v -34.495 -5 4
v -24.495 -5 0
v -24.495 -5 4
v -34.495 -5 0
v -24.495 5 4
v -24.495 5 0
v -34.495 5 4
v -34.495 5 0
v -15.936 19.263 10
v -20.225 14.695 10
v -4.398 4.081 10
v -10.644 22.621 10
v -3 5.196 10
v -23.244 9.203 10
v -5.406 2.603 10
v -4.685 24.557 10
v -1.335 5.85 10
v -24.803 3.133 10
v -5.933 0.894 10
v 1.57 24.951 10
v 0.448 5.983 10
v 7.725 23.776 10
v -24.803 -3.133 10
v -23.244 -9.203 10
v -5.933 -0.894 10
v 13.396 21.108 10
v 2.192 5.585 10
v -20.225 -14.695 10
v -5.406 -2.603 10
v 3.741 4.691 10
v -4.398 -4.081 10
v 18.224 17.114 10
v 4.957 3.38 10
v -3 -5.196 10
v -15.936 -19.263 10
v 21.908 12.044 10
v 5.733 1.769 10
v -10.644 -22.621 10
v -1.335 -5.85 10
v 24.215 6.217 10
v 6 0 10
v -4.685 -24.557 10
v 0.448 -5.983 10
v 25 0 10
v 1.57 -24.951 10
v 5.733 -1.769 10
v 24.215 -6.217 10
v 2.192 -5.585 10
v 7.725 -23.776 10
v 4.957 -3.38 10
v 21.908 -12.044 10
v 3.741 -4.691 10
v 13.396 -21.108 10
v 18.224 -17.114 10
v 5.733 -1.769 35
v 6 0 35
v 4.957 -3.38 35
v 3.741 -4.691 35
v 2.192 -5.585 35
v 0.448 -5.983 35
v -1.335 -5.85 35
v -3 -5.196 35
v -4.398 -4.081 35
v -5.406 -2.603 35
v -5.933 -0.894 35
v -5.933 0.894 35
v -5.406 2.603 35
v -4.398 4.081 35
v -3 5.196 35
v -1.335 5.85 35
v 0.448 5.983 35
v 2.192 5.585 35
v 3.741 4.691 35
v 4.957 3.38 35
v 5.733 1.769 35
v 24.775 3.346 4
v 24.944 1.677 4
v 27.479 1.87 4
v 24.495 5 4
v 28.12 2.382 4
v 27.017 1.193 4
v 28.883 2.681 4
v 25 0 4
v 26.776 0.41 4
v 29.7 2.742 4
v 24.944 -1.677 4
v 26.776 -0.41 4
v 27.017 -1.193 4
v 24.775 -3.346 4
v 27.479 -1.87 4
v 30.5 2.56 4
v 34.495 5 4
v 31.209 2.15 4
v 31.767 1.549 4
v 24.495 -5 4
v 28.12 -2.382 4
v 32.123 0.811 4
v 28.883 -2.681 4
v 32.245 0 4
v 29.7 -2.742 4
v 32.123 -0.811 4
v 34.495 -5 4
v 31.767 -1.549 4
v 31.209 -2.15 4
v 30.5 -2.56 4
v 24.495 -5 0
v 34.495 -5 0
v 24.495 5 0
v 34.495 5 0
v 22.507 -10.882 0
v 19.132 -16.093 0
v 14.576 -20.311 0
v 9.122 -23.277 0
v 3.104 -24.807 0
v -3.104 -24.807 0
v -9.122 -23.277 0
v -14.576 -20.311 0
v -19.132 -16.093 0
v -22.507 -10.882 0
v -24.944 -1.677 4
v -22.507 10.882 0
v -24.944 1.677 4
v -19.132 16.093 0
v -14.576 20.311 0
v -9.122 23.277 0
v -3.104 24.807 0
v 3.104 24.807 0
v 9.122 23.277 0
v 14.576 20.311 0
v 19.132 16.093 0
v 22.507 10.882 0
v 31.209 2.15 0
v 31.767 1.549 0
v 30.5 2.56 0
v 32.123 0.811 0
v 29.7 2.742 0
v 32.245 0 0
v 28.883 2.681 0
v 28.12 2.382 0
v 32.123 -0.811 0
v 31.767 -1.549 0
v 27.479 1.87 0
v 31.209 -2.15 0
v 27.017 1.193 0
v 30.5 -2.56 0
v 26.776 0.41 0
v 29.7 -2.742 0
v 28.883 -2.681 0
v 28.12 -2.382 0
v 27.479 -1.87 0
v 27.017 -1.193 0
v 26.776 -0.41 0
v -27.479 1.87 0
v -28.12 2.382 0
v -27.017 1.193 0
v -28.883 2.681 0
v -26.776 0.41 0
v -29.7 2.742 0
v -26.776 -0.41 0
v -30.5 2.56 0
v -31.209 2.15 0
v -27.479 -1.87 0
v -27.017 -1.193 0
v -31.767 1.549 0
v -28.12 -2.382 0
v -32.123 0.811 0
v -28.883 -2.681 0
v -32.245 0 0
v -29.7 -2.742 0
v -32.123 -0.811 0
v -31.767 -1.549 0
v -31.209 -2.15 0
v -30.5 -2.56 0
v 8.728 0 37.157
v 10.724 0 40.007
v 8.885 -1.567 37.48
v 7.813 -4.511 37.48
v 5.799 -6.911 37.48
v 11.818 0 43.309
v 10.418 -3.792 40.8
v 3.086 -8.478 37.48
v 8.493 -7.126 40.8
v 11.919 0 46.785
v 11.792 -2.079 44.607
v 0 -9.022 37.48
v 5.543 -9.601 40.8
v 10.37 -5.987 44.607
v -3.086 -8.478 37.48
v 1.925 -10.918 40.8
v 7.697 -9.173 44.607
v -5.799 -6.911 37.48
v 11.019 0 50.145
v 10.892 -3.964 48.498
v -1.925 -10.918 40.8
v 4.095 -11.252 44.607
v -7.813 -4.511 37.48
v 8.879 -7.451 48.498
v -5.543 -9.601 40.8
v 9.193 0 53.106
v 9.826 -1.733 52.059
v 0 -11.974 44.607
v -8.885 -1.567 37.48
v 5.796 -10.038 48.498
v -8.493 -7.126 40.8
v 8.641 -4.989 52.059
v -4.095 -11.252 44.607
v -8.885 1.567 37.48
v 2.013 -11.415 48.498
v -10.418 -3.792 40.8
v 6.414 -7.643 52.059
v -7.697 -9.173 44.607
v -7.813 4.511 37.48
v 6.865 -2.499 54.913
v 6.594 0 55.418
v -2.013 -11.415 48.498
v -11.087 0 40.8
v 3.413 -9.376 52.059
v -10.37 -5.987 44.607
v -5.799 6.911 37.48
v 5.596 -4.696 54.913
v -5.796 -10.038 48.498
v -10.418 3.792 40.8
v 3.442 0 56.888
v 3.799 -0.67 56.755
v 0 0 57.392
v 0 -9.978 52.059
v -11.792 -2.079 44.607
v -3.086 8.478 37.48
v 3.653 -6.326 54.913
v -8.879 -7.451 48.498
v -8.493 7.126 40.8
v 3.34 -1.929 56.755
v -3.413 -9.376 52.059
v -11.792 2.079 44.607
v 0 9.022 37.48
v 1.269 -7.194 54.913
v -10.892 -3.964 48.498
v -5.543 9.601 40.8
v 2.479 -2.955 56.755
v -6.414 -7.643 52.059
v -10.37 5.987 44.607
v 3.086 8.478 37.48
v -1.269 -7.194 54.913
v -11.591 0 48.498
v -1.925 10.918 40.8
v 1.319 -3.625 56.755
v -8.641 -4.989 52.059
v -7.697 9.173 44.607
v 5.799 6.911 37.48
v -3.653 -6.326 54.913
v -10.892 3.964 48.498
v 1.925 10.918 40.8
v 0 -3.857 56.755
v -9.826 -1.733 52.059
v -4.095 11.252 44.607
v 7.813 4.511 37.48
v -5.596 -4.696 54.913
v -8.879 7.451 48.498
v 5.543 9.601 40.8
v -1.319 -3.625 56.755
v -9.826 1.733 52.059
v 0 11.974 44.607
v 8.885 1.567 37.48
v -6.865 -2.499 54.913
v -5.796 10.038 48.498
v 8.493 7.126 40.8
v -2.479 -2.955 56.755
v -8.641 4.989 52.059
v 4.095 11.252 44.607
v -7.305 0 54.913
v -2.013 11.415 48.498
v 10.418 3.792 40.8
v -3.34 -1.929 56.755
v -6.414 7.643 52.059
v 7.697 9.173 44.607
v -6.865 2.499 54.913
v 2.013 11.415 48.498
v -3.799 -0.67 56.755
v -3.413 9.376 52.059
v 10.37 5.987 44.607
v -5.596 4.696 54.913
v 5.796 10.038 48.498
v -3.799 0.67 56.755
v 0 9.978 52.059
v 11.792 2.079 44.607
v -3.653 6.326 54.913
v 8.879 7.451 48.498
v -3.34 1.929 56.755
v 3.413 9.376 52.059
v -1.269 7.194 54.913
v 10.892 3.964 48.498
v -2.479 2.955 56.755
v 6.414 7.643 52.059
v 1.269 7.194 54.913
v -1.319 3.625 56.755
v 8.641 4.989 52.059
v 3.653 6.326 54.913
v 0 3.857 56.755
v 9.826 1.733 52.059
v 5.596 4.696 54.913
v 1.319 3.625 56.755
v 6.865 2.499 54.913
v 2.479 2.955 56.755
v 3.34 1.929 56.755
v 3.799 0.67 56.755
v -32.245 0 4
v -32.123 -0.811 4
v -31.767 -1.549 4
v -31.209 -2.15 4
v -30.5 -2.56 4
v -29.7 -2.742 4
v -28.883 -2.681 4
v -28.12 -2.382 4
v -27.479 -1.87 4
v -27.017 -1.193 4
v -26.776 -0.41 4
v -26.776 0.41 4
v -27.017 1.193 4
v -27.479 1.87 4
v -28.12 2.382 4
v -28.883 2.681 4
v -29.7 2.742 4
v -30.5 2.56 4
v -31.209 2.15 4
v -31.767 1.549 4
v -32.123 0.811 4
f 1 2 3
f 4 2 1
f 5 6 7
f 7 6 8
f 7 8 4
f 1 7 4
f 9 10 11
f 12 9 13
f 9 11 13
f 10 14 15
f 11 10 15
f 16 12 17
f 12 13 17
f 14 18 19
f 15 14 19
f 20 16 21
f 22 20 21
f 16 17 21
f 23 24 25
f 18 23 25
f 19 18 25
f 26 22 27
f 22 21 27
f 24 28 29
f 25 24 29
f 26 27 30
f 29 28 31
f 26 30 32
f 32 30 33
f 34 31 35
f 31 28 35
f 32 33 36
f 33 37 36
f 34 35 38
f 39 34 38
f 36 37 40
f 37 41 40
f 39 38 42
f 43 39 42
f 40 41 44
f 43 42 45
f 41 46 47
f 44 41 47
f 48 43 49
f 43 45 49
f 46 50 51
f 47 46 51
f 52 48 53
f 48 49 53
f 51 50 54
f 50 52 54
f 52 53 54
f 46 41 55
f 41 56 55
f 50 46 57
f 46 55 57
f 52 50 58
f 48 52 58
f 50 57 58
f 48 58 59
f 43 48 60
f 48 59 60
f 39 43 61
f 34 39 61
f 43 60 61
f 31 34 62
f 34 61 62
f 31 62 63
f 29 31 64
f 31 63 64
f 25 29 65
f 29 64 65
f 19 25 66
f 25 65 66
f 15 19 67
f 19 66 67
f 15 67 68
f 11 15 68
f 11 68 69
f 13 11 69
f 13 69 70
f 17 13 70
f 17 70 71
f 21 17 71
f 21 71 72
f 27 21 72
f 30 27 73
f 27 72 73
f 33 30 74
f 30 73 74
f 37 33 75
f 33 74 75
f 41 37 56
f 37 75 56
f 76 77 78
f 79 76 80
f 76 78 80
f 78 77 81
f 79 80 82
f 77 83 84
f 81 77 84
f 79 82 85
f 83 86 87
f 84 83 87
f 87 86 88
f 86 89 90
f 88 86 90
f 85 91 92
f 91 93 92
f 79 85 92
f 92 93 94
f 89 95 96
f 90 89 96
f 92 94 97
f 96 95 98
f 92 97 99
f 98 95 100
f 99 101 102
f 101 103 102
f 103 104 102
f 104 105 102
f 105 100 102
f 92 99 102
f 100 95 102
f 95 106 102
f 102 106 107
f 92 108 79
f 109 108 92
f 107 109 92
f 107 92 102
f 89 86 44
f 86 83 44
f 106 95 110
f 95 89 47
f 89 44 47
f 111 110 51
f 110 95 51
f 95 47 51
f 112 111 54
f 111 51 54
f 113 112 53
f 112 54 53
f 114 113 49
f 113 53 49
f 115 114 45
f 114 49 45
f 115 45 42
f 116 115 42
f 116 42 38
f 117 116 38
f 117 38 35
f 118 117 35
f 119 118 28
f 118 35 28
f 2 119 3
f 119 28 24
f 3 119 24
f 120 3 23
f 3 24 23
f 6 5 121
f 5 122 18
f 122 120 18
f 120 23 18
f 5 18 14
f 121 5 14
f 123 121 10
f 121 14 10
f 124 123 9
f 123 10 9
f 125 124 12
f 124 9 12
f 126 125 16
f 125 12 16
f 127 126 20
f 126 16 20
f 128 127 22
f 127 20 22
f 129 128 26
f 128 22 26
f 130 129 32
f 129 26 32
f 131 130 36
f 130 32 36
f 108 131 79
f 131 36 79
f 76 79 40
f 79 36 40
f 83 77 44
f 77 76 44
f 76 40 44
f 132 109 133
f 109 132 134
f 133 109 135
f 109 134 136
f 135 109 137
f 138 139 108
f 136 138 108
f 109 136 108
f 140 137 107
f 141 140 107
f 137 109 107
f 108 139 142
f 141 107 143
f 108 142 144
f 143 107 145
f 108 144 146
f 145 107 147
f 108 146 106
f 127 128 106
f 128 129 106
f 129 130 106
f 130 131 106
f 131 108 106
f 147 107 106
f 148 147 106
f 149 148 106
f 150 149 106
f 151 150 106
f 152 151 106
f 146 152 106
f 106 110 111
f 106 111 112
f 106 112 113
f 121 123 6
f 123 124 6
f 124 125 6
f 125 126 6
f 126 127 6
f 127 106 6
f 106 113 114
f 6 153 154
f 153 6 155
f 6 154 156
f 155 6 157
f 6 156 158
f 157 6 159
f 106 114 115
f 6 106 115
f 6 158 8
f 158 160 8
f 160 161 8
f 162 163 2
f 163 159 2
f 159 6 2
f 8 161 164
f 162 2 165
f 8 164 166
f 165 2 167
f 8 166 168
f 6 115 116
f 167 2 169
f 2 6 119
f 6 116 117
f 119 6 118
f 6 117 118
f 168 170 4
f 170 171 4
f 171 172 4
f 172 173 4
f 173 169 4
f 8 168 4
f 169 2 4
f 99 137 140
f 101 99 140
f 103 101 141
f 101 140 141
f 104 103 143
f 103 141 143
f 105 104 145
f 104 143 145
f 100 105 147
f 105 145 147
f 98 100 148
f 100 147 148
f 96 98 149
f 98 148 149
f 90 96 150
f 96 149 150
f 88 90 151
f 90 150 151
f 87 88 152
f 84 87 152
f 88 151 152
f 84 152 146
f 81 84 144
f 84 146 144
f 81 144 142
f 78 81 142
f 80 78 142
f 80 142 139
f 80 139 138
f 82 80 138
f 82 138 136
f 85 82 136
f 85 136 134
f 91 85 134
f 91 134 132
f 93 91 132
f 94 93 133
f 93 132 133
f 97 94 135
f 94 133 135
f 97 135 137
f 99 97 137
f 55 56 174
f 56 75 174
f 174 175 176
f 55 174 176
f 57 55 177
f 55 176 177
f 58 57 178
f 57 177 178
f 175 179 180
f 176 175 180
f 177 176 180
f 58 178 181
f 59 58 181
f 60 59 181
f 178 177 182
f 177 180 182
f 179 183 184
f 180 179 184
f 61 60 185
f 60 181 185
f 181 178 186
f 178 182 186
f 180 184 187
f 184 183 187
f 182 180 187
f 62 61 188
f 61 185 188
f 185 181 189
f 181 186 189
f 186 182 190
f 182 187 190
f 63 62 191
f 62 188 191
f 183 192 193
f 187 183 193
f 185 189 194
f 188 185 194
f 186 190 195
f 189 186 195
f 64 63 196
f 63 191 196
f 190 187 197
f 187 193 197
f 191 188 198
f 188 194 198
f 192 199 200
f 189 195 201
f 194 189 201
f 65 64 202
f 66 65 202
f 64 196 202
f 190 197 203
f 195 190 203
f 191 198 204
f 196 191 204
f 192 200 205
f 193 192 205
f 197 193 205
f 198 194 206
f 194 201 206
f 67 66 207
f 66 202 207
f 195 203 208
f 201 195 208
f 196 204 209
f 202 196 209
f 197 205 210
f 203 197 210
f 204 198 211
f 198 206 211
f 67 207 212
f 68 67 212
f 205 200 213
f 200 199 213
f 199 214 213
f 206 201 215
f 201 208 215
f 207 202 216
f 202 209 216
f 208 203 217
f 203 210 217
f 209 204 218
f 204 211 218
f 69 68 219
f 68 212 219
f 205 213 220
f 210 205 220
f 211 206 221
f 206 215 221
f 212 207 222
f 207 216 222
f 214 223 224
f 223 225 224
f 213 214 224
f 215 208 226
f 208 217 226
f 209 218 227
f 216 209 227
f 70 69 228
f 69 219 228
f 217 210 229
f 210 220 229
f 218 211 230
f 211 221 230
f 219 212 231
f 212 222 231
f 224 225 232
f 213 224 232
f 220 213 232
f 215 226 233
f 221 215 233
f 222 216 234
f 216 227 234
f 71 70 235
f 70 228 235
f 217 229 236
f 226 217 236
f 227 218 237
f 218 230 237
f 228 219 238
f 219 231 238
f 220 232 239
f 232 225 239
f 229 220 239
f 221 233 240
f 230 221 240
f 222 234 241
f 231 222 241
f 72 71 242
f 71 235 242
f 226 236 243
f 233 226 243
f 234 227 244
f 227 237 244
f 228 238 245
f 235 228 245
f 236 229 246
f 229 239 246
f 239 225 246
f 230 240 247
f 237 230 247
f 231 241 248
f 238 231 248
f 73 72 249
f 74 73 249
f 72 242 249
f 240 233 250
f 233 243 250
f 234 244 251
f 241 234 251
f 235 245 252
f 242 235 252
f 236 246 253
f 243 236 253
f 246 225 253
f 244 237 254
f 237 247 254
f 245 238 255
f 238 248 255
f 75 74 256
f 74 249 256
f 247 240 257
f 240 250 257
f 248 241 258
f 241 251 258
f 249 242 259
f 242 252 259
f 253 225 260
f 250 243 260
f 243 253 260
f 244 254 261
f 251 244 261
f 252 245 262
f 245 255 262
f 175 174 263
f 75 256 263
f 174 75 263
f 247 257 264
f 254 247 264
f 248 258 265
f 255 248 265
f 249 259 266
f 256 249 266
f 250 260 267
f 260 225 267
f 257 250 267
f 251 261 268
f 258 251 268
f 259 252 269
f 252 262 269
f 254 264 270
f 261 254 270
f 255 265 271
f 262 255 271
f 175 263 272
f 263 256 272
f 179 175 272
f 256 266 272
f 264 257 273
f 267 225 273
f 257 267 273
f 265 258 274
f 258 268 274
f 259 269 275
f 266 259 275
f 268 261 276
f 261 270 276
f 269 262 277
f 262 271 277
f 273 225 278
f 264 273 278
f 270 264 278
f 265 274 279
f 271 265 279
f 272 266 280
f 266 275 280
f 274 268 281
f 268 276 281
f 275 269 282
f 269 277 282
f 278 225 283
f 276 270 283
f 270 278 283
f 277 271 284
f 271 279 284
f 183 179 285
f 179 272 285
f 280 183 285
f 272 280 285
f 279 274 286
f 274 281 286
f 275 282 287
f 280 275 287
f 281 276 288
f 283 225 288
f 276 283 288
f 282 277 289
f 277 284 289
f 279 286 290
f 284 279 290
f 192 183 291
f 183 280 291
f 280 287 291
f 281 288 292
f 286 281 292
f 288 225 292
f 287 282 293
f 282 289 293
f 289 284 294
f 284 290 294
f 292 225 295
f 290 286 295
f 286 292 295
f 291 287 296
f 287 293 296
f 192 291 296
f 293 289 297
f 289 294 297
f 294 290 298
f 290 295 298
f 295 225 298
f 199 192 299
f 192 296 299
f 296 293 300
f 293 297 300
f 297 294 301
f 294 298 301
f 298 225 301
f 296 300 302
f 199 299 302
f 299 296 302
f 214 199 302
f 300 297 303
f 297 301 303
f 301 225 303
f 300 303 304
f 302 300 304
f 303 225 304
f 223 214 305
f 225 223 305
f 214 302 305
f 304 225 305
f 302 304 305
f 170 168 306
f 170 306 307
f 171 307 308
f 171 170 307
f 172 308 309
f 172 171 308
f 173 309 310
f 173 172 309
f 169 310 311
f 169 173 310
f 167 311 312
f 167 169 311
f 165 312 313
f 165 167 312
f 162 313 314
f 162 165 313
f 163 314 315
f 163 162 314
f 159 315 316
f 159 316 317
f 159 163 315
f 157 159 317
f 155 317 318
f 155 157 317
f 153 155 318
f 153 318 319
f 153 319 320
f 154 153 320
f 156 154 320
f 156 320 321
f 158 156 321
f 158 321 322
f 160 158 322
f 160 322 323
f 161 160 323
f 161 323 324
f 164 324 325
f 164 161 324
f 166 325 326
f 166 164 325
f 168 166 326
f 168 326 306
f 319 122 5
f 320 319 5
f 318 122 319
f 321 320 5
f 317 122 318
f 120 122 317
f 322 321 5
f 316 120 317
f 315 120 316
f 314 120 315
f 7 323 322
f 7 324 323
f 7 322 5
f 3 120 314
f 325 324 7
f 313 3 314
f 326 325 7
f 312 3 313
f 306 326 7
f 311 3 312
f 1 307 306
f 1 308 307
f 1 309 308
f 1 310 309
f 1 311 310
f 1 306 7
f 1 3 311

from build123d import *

# Parameters (mm, degrees)
F2_W     = 10
F2_H     = 10
F2_R     = 2.75
F3_DEPTH = 4


# Not quite as in the source:
# - a pattern or mirror of a feature is missing from the dataset's text; its kind, count and spacing are read off the source's solid


with BuildPart() as f1:
    # F0 (on Front) → F1 (revolve)
    with BuildSketch(Plane.XZ):
        with BuildLine():
            Line((25, 10), (6, 10))
            Line((6, 10), (6, 35))
            ThreePointArc((6, 35), (11.5911099155, 48.4981333866), (0, 57.3923048454))
            Line((0, 57.3923048454), (0, 0))
            Line((0, 0), (25, 0))
            Line((25, 0), (25, 10))
        make_face()
    revolve(axis=Axis((0, 0, 28.6961524227), (0, 0, -1)))

    # F2 (on face) → F3 (join)
    with BuildSketch(Plane(origin=(0, 0, 0), x_dir=(1, 0, 0), z_dir=(0, 0, -1))):
        with Locations((29.4948974278, 0)):
            Rectangle(F2_W, F2_H)
        with Locations((29.4948974278, 0)):
            Circle(F2_R, mode=Mode.SUBTRACT)
    f3 = extrude(amount=-F3_DEPTH)

    # F3_copies: F3 across plane
    add(f3.mirror(Plane(origin=(0, 0, 0), x_dir=(0, 0, -1), z_dir=(-1, 0, 0))))


solid = f1.part
